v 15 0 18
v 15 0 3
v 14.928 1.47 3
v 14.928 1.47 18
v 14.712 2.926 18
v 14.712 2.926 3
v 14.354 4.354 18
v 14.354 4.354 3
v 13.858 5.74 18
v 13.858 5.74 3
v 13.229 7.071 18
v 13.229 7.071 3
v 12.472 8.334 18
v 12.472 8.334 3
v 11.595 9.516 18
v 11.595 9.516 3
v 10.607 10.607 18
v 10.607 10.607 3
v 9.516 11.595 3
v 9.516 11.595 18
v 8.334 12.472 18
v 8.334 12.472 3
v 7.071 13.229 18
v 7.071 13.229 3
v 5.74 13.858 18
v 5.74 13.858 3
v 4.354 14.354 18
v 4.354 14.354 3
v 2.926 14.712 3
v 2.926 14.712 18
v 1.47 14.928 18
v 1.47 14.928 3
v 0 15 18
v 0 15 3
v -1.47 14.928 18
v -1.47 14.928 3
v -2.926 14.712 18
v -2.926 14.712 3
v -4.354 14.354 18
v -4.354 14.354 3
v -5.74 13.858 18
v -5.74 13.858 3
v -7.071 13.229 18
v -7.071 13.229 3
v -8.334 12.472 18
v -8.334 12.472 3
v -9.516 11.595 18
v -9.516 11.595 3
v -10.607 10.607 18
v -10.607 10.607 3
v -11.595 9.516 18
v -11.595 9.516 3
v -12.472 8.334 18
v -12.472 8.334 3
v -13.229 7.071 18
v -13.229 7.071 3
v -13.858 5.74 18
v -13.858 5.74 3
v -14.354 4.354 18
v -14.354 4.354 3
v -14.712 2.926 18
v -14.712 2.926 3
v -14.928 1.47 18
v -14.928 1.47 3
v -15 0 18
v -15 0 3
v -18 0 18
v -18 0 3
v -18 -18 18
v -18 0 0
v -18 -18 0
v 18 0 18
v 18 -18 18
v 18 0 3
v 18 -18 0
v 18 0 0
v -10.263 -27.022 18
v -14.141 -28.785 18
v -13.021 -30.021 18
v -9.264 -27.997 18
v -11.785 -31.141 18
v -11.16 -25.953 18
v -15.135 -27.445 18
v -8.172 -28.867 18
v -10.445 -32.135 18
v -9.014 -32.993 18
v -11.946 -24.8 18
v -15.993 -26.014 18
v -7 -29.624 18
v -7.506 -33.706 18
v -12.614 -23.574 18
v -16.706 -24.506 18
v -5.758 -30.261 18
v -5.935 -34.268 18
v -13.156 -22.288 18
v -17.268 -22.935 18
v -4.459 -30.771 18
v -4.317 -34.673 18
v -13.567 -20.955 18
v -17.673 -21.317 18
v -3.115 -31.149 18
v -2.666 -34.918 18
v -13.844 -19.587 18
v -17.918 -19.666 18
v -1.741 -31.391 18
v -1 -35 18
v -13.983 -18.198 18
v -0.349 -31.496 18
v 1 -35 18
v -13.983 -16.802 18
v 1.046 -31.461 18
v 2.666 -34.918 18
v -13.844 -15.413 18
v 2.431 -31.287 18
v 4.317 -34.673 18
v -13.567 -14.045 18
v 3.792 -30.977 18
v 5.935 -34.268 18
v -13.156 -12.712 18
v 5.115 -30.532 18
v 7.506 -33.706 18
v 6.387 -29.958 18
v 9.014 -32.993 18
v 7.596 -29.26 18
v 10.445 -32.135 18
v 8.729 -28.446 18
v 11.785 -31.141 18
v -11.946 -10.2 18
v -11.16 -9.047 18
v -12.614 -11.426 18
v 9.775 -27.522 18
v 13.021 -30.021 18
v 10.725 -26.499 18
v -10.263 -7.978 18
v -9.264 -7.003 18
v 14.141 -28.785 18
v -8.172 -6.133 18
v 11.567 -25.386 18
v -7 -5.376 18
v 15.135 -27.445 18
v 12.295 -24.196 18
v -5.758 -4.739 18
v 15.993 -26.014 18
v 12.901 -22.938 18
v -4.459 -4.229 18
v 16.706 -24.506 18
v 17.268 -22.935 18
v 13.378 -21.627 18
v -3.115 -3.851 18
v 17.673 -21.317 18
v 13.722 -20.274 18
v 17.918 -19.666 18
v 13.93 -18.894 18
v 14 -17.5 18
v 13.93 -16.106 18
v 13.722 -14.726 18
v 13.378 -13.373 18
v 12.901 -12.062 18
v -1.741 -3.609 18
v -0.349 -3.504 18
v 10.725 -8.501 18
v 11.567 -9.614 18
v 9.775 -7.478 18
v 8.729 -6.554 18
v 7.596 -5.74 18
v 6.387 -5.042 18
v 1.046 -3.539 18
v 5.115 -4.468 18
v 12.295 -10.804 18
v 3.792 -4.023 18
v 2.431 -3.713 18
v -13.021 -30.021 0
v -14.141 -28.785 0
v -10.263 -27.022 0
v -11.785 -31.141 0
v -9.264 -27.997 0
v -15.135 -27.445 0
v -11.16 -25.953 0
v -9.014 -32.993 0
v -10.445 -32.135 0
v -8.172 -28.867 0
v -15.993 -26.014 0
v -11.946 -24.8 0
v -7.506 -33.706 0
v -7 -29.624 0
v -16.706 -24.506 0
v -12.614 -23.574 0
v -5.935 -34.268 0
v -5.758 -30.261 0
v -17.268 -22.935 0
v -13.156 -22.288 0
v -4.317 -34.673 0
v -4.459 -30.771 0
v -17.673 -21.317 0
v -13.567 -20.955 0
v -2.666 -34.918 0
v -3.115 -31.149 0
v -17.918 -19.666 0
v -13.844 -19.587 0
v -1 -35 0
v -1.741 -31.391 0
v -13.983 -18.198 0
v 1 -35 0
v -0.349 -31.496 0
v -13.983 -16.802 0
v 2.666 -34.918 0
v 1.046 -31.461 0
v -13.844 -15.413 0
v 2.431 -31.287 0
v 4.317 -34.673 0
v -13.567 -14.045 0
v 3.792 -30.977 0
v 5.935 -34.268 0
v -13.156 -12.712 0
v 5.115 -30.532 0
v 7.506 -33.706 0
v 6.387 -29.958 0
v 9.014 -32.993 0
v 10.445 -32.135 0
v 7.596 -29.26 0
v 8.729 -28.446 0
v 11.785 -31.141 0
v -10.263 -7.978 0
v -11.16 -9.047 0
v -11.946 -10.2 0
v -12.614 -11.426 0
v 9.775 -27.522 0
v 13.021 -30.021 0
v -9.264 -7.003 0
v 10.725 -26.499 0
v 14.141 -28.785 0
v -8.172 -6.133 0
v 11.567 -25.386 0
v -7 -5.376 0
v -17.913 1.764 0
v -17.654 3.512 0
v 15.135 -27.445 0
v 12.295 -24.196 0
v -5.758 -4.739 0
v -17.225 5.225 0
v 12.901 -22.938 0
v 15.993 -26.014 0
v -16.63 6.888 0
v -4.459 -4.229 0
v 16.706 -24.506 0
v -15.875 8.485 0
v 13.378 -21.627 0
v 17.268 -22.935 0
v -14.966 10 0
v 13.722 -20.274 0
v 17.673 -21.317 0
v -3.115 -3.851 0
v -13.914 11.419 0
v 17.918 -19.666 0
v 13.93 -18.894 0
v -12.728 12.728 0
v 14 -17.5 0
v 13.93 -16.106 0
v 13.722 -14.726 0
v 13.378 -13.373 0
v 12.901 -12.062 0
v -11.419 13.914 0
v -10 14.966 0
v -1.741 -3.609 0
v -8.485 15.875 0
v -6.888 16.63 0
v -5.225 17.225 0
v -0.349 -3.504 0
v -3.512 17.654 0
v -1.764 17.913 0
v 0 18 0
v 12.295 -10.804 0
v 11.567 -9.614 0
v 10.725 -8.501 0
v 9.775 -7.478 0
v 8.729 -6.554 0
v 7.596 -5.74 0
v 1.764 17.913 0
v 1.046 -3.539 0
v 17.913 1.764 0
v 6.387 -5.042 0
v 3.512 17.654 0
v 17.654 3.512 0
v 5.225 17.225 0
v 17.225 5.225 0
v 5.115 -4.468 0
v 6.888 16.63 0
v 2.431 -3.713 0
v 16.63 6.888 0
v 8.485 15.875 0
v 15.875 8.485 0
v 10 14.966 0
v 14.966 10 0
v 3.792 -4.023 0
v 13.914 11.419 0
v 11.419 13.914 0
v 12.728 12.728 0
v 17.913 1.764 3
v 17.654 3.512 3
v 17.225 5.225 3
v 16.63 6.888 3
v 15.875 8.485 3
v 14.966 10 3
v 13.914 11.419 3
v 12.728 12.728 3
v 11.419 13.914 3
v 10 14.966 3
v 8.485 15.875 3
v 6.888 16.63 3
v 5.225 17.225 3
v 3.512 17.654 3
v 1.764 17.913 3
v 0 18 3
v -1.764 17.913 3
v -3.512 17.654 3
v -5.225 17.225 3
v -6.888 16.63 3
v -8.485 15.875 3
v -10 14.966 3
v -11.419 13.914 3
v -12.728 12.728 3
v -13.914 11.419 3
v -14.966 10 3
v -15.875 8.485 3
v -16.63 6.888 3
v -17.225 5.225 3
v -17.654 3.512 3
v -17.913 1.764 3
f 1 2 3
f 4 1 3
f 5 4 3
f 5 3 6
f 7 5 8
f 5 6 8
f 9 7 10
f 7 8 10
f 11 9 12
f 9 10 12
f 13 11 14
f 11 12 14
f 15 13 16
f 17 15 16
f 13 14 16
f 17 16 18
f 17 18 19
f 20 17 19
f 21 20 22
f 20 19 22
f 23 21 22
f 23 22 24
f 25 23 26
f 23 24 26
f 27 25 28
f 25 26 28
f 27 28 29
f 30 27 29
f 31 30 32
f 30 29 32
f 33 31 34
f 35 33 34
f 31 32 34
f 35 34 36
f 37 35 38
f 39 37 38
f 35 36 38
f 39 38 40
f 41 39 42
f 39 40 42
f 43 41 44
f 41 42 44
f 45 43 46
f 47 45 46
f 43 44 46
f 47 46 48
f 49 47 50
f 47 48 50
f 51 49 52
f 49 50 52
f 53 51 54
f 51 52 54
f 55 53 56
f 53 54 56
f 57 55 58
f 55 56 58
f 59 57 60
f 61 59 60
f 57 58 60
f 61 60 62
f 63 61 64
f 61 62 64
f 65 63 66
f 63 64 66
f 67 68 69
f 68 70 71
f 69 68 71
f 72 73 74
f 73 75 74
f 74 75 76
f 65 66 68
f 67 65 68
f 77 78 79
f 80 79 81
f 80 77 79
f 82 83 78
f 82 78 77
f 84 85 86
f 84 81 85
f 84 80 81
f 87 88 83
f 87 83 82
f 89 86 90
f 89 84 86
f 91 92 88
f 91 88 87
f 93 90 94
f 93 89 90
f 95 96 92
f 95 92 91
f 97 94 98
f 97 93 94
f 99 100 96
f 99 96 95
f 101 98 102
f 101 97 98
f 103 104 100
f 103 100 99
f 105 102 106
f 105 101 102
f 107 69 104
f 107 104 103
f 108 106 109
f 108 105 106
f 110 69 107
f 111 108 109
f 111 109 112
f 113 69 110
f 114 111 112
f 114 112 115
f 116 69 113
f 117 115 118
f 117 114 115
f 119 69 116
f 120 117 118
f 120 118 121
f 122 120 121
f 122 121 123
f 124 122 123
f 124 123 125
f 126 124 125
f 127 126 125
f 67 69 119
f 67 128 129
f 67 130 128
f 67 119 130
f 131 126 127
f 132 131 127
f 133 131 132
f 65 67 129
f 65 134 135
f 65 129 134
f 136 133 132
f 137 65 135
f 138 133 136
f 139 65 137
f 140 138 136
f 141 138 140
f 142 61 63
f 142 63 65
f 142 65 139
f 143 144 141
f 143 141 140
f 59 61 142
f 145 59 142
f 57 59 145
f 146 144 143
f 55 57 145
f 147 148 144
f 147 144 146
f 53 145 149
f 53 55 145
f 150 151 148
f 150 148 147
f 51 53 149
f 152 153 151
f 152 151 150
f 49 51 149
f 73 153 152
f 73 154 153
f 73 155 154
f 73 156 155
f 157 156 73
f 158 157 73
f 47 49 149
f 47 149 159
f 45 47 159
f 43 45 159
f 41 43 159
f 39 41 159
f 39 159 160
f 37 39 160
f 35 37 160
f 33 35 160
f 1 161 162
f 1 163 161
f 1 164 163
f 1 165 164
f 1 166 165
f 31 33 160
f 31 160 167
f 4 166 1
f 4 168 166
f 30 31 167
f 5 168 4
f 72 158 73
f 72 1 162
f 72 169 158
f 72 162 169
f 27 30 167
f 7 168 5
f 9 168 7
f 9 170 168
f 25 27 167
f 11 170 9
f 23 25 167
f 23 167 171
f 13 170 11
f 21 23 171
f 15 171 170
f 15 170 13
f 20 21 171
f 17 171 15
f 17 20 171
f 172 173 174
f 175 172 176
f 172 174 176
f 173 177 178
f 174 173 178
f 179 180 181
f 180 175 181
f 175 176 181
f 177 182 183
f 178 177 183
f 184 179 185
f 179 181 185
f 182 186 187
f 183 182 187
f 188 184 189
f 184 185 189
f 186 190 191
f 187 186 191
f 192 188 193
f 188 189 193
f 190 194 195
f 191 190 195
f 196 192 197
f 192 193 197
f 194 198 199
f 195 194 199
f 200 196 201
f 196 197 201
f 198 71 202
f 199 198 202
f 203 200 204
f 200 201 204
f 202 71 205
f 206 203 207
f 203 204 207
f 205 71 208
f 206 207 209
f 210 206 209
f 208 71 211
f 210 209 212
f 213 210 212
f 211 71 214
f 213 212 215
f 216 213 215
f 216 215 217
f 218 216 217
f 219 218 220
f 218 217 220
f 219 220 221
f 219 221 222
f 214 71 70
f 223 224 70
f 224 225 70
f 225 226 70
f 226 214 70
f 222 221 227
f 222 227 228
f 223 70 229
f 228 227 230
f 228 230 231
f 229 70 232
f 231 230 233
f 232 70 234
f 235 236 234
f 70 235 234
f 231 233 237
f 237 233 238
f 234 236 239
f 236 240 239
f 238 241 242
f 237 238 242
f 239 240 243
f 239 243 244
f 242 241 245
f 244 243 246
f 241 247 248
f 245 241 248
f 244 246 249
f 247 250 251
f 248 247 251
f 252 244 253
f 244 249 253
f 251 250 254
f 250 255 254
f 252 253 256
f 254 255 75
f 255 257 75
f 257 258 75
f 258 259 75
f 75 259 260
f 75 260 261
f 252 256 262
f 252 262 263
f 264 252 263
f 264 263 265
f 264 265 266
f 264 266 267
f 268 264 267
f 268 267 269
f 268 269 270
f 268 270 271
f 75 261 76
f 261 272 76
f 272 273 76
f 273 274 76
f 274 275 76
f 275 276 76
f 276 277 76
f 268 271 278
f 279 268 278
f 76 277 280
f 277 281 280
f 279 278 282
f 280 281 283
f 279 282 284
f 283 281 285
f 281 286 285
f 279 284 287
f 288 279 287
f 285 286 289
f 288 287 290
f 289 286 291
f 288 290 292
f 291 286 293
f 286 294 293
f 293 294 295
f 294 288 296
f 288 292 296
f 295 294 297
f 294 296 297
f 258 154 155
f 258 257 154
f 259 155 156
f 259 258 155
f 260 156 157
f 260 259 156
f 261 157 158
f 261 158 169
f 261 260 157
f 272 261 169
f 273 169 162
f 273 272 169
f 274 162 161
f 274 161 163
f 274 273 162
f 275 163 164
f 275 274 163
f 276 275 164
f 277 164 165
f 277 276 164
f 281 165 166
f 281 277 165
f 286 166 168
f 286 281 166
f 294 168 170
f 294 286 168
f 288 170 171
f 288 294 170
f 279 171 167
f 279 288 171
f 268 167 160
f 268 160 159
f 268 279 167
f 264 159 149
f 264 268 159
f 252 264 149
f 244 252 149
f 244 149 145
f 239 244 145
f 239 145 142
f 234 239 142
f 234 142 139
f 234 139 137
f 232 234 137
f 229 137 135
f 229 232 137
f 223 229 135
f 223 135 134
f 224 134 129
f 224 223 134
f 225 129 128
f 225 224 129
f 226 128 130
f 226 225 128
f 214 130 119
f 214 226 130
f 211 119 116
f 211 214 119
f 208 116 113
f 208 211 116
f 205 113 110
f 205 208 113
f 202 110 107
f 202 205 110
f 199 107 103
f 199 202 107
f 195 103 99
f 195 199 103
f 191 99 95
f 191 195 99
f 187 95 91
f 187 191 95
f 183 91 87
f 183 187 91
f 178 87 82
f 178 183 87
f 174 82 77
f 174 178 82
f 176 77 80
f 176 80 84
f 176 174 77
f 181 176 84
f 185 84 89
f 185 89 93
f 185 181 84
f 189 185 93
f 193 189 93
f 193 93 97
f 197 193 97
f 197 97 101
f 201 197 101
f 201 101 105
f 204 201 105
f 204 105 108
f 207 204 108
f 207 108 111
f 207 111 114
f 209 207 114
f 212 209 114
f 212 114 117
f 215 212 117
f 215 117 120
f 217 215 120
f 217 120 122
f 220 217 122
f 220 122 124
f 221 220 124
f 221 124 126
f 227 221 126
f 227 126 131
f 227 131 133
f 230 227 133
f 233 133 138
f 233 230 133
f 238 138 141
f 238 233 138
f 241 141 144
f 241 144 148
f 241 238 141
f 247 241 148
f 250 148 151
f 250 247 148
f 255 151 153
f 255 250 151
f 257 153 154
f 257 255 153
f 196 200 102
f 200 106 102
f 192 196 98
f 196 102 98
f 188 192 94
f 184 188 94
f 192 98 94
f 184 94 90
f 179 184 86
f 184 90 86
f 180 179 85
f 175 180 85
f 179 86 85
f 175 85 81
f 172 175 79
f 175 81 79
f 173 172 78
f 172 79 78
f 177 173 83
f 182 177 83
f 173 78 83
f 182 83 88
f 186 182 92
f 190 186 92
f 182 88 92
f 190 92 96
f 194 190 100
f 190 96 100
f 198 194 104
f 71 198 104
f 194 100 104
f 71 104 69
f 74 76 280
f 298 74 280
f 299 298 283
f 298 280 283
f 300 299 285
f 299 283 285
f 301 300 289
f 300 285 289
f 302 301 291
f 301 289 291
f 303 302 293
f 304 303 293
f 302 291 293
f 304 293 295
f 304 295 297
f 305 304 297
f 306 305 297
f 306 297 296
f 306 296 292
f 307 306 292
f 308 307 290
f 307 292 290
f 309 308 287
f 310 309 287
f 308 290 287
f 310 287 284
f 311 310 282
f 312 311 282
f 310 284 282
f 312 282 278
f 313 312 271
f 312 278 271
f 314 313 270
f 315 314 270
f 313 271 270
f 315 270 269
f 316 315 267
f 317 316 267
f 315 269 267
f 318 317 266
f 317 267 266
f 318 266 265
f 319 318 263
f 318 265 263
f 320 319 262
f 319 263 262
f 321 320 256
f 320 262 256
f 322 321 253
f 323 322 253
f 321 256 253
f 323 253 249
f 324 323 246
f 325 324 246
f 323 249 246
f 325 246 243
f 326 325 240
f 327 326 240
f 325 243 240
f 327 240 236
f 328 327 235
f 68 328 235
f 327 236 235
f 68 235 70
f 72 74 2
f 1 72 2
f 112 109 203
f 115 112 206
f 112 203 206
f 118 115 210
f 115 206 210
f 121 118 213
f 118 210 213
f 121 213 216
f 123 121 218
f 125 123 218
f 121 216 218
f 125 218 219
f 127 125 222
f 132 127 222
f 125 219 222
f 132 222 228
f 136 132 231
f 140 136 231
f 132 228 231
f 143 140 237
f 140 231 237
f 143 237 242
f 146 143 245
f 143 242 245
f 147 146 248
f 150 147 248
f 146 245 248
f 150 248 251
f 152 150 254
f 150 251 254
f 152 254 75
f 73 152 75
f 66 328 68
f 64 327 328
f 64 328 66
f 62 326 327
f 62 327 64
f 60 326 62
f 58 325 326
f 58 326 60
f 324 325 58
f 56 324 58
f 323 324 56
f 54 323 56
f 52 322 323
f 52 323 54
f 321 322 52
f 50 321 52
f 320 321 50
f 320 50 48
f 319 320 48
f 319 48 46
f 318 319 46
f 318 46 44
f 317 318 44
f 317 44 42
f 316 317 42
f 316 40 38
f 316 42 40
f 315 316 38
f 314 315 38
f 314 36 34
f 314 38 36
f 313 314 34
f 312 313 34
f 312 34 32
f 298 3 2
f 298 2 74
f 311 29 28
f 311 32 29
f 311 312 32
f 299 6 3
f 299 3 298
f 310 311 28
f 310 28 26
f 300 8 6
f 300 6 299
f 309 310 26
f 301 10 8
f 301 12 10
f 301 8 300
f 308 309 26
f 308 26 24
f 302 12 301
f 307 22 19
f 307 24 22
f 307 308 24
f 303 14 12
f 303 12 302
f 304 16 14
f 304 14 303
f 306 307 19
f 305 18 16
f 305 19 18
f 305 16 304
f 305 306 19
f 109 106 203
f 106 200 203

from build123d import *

# Parameters (mm, degrees)
F0_W     = 36
F0_H     = 35
F0_R     = 14
F1_DEPTH = 3
F2_R     = 14
F3_DEPTH = 15
F4_R     = 17


with BuildPart() as f1:
    # F0 (on Top) → F1 (new body)
    with BuildSketch(Plane.XY):
        with Locations((0, -17.5)):
            Rectangle(F0_W, F0_H)
        with Locations((0, -17.5)):
            Circle(F0_R, mode=Mode.SUBTRACT)
        with BuildLine():
            Line((-18, 0), (18, 0))
            ThreePointArc((18, 0), (0, 18), (-18, 0))
        make_face()
    extrude(amount=F1_DEPTH)

    # F2 (on face) → F3 (join)
    with BuildSketch(Plane.XY.offset(3)):
        with BuildLine():
            ThreePointArc((15, 0), (0, 15), (-15, 0))
            Line((-15, 0), (15, 0))
        make_face()
        Polygon((-15, 0), (-18, 0), (-18, -35), (18, -35), (18, 0), (15, 0), align=None)
        with Locations((0, -17.5)):
            Circle(F2_R, mode=Mode.SUBTRACT)
    extrude(amount=F3_DEPTH)

    # F4
    f4_edges = [f1.edges().sort_by_distance(p)[0] for p in [
        (-18, -35, 9),
        (18, -35, 9),
    ]]
    fillet(f4_edges, radius=F4_R)


solid = f1.part
